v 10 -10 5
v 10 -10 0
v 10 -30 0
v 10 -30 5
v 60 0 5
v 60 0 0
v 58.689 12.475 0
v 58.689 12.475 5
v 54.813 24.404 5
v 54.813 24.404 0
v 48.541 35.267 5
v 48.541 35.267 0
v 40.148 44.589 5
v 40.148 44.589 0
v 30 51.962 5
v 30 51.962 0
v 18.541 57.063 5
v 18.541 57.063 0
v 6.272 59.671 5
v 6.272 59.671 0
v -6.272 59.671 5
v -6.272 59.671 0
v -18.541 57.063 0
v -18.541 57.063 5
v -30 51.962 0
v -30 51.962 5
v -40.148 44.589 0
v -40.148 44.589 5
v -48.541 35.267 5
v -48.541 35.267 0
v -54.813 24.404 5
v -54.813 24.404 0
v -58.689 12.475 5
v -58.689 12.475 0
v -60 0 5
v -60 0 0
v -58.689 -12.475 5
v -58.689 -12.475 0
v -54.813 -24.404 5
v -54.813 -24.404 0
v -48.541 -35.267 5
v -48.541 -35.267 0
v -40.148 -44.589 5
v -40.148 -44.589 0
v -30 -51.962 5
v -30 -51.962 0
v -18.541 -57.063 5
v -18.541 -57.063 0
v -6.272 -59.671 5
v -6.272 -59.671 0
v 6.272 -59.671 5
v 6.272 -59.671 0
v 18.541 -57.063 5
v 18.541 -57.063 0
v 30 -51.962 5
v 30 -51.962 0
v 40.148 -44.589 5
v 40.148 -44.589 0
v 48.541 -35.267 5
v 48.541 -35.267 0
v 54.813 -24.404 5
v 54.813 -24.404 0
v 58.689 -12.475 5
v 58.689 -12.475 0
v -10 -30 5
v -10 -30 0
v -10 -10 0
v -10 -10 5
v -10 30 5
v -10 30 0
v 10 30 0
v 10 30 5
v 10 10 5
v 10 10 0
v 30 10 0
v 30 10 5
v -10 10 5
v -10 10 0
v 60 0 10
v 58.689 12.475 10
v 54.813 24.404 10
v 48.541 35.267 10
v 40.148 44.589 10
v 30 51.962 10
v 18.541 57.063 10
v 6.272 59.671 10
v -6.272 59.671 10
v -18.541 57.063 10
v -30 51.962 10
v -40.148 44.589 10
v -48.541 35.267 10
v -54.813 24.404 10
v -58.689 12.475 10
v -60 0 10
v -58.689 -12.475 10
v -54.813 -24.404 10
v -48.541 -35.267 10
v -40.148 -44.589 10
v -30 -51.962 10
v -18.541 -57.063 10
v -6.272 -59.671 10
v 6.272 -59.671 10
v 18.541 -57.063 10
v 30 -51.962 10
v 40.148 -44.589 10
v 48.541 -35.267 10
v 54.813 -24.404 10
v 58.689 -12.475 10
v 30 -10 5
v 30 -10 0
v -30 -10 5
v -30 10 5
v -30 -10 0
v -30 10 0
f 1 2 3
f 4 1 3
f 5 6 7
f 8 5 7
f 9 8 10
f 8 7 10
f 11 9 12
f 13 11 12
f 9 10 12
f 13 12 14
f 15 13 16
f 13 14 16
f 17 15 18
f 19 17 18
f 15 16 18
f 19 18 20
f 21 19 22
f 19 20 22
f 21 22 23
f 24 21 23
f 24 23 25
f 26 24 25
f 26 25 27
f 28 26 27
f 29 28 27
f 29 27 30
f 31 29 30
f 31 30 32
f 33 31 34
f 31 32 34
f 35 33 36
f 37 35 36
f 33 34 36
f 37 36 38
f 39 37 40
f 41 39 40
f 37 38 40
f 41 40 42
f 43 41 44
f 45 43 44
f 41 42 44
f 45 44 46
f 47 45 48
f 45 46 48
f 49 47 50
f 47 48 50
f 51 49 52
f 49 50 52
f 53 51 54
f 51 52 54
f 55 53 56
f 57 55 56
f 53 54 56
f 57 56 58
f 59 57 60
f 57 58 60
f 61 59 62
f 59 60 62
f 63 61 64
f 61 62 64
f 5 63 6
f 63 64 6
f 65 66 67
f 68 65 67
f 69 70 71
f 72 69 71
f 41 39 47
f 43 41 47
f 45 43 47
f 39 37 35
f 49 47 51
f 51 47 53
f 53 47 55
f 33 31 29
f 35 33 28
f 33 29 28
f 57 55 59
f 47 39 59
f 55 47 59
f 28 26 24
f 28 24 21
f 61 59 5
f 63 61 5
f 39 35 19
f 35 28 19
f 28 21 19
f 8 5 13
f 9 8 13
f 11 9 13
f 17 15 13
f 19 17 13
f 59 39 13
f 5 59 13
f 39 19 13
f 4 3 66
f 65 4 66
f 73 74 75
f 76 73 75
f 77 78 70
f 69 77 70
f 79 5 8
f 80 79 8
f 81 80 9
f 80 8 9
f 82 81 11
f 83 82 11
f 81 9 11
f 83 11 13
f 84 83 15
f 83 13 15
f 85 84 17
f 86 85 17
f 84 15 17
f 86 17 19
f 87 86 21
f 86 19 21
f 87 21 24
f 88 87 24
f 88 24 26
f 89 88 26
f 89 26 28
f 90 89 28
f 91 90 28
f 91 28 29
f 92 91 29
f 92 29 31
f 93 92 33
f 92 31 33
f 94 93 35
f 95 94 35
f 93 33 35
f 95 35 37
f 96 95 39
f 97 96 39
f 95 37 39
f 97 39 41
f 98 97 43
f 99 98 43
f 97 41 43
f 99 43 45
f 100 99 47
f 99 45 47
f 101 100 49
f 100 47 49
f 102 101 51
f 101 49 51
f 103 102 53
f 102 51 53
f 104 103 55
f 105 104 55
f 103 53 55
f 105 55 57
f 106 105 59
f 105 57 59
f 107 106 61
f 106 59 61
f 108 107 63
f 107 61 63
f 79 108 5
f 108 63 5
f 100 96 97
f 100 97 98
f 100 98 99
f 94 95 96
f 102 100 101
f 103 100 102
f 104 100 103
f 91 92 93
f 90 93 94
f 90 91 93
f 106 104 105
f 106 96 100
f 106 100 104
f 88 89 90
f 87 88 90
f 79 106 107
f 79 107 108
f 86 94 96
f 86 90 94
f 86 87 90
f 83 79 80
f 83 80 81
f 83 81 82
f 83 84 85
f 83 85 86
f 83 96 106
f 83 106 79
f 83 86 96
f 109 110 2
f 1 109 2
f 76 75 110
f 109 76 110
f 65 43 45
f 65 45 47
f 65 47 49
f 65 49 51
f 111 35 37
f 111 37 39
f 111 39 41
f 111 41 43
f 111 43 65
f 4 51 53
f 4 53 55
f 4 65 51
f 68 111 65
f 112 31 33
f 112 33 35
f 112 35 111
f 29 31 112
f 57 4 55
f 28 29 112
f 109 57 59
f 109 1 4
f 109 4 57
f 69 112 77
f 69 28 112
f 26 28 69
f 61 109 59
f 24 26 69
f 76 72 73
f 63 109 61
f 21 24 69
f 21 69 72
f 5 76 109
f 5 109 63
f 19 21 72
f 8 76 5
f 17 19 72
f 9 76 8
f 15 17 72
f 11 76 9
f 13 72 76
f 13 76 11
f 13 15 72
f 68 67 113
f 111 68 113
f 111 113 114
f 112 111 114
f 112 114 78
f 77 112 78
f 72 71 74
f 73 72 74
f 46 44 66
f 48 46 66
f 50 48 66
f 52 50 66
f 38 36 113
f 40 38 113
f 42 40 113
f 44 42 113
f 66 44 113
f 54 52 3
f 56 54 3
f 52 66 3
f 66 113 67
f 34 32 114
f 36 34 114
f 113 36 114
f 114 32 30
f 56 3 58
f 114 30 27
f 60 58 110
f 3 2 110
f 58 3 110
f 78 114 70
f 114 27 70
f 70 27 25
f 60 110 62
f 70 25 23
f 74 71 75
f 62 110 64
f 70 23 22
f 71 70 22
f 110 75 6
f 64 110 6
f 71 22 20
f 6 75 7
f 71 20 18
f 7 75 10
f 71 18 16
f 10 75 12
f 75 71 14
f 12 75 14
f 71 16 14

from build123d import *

# Parameters (mm, degrees)
F0_R     = 60
F1_DEPTH = 5
F2_R     = 60
F3_DEPTH = 5


with BuildPart() as f1:
    # F0 (on Top) → F1 (new body)
    with BuildSketch(Plane.XY):
        Circle(F0_R)
        Polygon((-10, 30), (0, 30), (10, 30), (10, 10), (30, 10), (30, 0), (30, -10), (10, -10), (10, -30), (0, -30), (-10, -30), (-10, -10), (-30, -10), (-30, 0), (-30, 10), (-10, 10), align=None, mode=Mode.SUBTRACT)
    extrude(amount=F1_DEPTH)


with BuildPart() as f3:
    # F2 (on face) → F3 (new body)
    with BuildSketch(Plane.XY.offset(5)):
        Circle(F2_R)
    extrude(amount=F3_DEPTH)


solid = Compound([f1.part, f3.part])
